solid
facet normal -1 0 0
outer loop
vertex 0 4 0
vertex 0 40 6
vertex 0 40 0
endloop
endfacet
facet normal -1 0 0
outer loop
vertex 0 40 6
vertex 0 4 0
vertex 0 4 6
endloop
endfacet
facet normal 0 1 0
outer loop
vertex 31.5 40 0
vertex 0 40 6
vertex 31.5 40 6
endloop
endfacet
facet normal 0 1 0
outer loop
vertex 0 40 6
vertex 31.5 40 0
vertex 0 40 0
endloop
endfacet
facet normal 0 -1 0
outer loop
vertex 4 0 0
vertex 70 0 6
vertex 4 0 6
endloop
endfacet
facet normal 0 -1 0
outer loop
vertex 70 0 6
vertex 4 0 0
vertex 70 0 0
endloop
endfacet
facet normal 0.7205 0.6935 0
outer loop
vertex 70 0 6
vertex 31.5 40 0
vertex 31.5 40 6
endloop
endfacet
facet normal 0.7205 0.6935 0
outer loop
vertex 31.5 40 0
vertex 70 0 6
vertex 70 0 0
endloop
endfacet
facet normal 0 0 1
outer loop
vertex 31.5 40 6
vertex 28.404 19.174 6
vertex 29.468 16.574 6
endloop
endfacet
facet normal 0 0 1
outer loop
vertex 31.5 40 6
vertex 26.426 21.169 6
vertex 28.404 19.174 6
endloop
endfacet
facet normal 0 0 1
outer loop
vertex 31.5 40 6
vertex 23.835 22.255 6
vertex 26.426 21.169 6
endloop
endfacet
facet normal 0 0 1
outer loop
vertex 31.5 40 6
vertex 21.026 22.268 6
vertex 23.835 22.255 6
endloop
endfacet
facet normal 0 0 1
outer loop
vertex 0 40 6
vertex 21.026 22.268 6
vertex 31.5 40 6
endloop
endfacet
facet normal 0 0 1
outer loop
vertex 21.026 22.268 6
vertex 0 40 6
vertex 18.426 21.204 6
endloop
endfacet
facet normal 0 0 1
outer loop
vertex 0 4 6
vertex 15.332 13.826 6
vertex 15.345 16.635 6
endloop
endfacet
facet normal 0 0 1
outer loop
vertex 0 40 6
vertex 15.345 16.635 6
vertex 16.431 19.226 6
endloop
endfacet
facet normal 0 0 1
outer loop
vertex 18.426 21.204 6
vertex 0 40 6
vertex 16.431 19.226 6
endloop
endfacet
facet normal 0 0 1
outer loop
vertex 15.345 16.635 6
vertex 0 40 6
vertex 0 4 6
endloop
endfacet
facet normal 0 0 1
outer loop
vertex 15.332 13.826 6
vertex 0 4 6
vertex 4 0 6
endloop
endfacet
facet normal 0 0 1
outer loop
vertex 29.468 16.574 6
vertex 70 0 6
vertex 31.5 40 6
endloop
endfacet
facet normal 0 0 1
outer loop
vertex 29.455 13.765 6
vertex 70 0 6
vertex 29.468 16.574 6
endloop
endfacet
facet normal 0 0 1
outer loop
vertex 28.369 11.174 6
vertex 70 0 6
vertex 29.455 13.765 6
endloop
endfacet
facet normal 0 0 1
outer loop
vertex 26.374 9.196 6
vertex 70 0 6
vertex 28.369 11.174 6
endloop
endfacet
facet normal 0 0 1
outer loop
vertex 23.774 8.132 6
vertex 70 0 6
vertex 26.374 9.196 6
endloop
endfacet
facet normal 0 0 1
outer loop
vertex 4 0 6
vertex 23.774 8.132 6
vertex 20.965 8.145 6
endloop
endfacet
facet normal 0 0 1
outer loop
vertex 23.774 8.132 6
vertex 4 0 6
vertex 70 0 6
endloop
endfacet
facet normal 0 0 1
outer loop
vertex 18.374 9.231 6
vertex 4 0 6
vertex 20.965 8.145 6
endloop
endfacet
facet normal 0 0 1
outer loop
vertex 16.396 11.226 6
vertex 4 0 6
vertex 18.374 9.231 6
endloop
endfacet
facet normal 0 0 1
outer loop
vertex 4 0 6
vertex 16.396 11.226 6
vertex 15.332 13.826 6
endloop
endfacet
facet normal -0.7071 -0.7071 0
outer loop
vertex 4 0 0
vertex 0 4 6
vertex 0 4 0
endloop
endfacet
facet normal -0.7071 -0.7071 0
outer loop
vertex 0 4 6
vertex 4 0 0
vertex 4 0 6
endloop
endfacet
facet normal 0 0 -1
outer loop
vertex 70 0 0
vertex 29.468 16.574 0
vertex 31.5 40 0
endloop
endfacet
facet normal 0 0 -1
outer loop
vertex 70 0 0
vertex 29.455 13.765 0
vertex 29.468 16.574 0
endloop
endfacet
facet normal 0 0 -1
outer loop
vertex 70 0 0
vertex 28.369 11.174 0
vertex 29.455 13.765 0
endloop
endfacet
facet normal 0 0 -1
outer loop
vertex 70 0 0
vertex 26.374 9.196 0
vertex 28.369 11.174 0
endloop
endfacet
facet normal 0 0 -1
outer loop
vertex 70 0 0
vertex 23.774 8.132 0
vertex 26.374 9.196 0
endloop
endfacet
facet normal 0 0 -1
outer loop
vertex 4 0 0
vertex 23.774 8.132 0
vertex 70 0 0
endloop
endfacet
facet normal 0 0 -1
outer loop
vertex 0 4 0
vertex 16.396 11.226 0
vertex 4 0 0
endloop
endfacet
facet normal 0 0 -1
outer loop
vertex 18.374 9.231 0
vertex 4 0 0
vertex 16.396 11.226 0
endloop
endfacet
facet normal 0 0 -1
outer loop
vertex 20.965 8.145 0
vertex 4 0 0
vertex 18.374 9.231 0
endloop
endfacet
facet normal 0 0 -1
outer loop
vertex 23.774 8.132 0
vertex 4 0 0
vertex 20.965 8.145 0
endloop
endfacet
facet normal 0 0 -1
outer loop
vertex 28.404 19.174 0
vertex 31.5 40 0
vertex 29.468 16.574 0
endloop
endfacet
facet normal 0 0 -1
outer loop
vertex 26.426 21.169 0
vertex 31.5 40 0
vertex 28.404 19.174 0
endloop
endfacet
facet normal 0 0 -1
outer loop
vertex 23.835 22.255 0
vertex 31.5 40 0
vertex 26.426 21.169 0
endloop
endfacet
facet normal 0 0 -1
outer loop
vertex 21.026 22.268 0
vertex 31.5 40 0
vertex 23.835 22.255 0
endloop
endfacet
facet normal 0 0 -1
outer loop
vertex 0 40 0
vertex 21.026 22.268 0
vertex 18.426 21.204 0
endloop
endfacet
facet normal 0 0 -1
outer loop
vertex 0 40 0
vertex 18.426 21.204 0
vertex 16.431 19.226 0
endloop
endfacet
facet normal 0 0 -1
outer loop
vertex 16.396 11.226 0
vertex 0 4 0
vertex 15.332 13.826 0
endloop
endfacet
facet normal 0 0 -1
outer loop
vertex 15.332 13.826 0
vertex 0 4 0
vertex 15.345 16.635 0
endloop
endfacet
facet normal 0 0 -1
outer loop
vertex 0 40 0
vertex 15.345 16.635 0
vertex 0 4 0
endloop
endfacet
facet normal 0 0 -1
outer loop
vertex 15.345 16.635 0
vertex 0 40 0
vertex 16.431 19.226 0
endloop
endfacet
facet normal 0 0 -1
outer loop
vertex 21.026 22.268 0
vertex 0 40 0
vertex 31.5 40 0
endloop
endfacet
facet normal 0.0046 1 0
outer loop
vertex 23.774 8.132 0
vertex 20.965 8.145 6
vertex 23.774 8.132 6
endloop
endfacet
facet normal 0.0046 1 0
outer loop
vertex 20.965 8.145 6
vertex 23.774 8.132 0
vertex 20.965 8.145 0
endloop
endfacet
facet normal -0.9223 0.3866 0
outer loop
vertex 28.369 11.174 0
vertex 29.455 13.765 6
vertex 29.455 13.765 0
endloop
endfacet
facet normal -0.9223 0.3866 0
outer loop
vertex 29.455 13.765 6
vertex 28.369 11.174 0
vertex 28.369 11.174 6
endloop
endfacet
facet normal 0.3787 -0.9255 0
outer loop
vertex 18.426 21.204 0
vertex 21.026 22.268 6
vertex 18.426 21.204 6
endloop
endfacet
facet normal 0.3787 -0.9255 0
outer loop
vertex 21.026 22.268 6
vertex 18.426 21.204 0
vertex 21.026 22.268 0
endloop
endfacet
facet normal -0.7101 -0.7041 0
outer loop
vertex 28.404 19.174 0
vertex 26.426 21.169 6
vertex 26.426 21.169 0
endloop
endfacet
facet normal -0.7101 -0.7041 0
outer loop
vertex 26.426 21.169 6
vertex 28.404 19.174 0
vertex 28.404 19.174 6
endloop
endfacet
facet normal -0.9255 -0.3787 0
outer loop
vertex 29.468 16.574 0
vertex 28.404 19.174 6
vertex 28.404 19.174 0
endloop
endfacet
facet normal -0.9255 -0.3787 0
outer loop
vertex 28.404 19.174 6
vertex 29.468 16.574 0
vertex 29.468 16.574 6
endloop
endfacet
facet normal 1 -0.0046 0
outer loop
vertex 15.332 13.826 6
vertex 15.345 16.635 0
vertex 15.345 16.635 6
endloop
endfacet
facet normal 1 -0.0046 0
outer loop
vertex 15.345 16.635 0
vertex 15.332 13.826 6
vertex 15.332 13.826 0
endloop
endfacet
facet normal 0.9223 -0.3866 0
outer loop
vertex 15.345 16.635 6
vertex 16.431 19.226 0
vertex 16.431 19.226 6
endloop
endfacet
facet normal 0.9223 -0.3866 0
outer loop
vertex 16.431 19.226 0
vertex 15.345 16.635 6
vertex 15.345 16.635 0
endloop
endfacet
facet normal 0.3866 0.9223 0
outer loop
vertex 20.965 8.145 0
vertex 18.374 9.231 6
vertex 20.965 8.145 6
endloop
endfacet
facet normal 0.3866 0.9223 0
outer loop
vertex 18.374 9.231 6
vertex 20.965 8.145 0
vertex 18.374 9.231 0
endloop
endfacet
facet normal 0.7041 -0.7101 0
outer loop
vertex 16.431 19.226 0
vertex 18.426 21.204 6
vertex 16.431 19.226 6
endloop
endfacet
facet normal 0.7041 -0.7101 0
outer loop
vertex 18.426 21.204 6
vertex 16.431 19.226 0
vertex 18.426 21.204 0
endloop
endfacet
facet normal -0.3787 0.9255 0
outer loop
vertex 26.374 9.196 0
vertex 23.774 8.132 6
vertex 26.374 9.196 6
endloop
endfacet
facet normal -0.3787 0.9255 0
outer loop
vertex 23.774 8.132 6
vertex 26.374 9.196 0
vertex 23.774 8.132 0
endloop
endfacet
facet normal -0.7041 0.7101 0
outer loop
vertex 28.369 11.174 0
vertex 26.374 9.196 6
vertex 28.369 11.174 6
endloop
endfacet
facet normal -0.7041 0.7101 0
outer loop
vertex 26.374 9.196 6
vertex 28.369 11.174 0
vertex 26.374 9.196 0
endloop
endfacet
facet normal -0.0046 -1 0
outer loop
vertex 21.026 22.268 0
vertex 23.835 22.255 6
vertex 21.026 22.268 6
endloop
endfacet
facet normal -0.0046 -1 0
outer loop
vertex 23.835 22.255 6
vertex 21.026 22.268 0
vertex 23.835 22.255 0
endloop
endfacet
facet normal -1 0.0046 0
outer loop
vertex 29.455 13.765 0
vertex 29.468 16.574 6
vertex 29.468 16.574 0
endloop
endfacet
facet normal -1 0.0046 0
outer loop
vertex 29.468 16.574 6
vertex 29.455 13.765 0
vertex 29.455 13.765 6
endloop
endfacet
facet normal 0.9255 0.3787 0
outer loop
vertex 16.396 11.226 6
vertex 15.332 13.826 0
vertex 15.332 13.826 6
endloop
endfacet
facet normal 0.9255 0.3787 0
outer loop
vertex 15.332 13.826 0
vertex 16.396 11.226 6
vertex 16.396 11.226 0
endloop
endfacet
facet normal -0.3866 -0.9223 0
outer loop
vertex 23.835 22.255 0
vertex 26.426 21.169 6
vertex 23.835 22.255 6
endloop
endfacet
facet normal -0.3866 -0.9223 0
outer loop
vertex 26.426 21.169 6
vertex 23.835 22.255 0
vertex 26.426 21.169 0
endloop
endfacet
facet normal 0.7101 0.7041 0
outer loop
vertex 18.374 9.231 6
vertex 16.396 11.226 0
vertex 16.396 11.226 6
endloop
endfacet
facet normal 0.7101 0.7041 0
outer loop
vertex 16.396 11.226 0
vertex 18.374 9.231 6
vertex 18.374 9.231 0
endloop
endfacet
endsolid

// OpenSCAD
$fn = 32;

// ----------------------------------------------------------------------
// Bracket plate: gusset 70 x 40
// ----------------------------------------------------------------------

// --- parameters (mm) ---
hole_r = 3;               // bolt hole radius
plate_t = 6;              // plate thickness, Z (extrusion height)
gus_a = 70;               // base length
gus_b = 40;               // height
top_x = 31.5;             // top edge X of the angled cut
light_r = 7.2;            // lightening hole radius

light_d = 2 * light_r;

profile = [[4, 0], [35, 0], [70, 0], [31.5, 40], [0, 40], [0, 4]];  // primary outline, 6 points, counter clockwise
void_1 = [[29.468, 16.574], [28.404, 19.174], [26.426, 21.169], [23.835, 22.255], [21.026, 22.268], [18.426, 21.204], [16.431, 19.226], [15.345, 16.635], [15.332, 13.826], [16.396, 11.226], [18.374, 9.231], [20.965, 8.145], [23.774, 8.132], [26.374, 9.196], [28.369, 11.174], [29.455, 13.765]];  // lightening hole, 16 points

// --- the one profile operation ---
difference() {
  linear_extrude(height = plate_t) polygon(points = profile);
  translate([0, 0, -1])
    linear_extrude(height = plate_t + 2) polygon(points = void_1);
}
